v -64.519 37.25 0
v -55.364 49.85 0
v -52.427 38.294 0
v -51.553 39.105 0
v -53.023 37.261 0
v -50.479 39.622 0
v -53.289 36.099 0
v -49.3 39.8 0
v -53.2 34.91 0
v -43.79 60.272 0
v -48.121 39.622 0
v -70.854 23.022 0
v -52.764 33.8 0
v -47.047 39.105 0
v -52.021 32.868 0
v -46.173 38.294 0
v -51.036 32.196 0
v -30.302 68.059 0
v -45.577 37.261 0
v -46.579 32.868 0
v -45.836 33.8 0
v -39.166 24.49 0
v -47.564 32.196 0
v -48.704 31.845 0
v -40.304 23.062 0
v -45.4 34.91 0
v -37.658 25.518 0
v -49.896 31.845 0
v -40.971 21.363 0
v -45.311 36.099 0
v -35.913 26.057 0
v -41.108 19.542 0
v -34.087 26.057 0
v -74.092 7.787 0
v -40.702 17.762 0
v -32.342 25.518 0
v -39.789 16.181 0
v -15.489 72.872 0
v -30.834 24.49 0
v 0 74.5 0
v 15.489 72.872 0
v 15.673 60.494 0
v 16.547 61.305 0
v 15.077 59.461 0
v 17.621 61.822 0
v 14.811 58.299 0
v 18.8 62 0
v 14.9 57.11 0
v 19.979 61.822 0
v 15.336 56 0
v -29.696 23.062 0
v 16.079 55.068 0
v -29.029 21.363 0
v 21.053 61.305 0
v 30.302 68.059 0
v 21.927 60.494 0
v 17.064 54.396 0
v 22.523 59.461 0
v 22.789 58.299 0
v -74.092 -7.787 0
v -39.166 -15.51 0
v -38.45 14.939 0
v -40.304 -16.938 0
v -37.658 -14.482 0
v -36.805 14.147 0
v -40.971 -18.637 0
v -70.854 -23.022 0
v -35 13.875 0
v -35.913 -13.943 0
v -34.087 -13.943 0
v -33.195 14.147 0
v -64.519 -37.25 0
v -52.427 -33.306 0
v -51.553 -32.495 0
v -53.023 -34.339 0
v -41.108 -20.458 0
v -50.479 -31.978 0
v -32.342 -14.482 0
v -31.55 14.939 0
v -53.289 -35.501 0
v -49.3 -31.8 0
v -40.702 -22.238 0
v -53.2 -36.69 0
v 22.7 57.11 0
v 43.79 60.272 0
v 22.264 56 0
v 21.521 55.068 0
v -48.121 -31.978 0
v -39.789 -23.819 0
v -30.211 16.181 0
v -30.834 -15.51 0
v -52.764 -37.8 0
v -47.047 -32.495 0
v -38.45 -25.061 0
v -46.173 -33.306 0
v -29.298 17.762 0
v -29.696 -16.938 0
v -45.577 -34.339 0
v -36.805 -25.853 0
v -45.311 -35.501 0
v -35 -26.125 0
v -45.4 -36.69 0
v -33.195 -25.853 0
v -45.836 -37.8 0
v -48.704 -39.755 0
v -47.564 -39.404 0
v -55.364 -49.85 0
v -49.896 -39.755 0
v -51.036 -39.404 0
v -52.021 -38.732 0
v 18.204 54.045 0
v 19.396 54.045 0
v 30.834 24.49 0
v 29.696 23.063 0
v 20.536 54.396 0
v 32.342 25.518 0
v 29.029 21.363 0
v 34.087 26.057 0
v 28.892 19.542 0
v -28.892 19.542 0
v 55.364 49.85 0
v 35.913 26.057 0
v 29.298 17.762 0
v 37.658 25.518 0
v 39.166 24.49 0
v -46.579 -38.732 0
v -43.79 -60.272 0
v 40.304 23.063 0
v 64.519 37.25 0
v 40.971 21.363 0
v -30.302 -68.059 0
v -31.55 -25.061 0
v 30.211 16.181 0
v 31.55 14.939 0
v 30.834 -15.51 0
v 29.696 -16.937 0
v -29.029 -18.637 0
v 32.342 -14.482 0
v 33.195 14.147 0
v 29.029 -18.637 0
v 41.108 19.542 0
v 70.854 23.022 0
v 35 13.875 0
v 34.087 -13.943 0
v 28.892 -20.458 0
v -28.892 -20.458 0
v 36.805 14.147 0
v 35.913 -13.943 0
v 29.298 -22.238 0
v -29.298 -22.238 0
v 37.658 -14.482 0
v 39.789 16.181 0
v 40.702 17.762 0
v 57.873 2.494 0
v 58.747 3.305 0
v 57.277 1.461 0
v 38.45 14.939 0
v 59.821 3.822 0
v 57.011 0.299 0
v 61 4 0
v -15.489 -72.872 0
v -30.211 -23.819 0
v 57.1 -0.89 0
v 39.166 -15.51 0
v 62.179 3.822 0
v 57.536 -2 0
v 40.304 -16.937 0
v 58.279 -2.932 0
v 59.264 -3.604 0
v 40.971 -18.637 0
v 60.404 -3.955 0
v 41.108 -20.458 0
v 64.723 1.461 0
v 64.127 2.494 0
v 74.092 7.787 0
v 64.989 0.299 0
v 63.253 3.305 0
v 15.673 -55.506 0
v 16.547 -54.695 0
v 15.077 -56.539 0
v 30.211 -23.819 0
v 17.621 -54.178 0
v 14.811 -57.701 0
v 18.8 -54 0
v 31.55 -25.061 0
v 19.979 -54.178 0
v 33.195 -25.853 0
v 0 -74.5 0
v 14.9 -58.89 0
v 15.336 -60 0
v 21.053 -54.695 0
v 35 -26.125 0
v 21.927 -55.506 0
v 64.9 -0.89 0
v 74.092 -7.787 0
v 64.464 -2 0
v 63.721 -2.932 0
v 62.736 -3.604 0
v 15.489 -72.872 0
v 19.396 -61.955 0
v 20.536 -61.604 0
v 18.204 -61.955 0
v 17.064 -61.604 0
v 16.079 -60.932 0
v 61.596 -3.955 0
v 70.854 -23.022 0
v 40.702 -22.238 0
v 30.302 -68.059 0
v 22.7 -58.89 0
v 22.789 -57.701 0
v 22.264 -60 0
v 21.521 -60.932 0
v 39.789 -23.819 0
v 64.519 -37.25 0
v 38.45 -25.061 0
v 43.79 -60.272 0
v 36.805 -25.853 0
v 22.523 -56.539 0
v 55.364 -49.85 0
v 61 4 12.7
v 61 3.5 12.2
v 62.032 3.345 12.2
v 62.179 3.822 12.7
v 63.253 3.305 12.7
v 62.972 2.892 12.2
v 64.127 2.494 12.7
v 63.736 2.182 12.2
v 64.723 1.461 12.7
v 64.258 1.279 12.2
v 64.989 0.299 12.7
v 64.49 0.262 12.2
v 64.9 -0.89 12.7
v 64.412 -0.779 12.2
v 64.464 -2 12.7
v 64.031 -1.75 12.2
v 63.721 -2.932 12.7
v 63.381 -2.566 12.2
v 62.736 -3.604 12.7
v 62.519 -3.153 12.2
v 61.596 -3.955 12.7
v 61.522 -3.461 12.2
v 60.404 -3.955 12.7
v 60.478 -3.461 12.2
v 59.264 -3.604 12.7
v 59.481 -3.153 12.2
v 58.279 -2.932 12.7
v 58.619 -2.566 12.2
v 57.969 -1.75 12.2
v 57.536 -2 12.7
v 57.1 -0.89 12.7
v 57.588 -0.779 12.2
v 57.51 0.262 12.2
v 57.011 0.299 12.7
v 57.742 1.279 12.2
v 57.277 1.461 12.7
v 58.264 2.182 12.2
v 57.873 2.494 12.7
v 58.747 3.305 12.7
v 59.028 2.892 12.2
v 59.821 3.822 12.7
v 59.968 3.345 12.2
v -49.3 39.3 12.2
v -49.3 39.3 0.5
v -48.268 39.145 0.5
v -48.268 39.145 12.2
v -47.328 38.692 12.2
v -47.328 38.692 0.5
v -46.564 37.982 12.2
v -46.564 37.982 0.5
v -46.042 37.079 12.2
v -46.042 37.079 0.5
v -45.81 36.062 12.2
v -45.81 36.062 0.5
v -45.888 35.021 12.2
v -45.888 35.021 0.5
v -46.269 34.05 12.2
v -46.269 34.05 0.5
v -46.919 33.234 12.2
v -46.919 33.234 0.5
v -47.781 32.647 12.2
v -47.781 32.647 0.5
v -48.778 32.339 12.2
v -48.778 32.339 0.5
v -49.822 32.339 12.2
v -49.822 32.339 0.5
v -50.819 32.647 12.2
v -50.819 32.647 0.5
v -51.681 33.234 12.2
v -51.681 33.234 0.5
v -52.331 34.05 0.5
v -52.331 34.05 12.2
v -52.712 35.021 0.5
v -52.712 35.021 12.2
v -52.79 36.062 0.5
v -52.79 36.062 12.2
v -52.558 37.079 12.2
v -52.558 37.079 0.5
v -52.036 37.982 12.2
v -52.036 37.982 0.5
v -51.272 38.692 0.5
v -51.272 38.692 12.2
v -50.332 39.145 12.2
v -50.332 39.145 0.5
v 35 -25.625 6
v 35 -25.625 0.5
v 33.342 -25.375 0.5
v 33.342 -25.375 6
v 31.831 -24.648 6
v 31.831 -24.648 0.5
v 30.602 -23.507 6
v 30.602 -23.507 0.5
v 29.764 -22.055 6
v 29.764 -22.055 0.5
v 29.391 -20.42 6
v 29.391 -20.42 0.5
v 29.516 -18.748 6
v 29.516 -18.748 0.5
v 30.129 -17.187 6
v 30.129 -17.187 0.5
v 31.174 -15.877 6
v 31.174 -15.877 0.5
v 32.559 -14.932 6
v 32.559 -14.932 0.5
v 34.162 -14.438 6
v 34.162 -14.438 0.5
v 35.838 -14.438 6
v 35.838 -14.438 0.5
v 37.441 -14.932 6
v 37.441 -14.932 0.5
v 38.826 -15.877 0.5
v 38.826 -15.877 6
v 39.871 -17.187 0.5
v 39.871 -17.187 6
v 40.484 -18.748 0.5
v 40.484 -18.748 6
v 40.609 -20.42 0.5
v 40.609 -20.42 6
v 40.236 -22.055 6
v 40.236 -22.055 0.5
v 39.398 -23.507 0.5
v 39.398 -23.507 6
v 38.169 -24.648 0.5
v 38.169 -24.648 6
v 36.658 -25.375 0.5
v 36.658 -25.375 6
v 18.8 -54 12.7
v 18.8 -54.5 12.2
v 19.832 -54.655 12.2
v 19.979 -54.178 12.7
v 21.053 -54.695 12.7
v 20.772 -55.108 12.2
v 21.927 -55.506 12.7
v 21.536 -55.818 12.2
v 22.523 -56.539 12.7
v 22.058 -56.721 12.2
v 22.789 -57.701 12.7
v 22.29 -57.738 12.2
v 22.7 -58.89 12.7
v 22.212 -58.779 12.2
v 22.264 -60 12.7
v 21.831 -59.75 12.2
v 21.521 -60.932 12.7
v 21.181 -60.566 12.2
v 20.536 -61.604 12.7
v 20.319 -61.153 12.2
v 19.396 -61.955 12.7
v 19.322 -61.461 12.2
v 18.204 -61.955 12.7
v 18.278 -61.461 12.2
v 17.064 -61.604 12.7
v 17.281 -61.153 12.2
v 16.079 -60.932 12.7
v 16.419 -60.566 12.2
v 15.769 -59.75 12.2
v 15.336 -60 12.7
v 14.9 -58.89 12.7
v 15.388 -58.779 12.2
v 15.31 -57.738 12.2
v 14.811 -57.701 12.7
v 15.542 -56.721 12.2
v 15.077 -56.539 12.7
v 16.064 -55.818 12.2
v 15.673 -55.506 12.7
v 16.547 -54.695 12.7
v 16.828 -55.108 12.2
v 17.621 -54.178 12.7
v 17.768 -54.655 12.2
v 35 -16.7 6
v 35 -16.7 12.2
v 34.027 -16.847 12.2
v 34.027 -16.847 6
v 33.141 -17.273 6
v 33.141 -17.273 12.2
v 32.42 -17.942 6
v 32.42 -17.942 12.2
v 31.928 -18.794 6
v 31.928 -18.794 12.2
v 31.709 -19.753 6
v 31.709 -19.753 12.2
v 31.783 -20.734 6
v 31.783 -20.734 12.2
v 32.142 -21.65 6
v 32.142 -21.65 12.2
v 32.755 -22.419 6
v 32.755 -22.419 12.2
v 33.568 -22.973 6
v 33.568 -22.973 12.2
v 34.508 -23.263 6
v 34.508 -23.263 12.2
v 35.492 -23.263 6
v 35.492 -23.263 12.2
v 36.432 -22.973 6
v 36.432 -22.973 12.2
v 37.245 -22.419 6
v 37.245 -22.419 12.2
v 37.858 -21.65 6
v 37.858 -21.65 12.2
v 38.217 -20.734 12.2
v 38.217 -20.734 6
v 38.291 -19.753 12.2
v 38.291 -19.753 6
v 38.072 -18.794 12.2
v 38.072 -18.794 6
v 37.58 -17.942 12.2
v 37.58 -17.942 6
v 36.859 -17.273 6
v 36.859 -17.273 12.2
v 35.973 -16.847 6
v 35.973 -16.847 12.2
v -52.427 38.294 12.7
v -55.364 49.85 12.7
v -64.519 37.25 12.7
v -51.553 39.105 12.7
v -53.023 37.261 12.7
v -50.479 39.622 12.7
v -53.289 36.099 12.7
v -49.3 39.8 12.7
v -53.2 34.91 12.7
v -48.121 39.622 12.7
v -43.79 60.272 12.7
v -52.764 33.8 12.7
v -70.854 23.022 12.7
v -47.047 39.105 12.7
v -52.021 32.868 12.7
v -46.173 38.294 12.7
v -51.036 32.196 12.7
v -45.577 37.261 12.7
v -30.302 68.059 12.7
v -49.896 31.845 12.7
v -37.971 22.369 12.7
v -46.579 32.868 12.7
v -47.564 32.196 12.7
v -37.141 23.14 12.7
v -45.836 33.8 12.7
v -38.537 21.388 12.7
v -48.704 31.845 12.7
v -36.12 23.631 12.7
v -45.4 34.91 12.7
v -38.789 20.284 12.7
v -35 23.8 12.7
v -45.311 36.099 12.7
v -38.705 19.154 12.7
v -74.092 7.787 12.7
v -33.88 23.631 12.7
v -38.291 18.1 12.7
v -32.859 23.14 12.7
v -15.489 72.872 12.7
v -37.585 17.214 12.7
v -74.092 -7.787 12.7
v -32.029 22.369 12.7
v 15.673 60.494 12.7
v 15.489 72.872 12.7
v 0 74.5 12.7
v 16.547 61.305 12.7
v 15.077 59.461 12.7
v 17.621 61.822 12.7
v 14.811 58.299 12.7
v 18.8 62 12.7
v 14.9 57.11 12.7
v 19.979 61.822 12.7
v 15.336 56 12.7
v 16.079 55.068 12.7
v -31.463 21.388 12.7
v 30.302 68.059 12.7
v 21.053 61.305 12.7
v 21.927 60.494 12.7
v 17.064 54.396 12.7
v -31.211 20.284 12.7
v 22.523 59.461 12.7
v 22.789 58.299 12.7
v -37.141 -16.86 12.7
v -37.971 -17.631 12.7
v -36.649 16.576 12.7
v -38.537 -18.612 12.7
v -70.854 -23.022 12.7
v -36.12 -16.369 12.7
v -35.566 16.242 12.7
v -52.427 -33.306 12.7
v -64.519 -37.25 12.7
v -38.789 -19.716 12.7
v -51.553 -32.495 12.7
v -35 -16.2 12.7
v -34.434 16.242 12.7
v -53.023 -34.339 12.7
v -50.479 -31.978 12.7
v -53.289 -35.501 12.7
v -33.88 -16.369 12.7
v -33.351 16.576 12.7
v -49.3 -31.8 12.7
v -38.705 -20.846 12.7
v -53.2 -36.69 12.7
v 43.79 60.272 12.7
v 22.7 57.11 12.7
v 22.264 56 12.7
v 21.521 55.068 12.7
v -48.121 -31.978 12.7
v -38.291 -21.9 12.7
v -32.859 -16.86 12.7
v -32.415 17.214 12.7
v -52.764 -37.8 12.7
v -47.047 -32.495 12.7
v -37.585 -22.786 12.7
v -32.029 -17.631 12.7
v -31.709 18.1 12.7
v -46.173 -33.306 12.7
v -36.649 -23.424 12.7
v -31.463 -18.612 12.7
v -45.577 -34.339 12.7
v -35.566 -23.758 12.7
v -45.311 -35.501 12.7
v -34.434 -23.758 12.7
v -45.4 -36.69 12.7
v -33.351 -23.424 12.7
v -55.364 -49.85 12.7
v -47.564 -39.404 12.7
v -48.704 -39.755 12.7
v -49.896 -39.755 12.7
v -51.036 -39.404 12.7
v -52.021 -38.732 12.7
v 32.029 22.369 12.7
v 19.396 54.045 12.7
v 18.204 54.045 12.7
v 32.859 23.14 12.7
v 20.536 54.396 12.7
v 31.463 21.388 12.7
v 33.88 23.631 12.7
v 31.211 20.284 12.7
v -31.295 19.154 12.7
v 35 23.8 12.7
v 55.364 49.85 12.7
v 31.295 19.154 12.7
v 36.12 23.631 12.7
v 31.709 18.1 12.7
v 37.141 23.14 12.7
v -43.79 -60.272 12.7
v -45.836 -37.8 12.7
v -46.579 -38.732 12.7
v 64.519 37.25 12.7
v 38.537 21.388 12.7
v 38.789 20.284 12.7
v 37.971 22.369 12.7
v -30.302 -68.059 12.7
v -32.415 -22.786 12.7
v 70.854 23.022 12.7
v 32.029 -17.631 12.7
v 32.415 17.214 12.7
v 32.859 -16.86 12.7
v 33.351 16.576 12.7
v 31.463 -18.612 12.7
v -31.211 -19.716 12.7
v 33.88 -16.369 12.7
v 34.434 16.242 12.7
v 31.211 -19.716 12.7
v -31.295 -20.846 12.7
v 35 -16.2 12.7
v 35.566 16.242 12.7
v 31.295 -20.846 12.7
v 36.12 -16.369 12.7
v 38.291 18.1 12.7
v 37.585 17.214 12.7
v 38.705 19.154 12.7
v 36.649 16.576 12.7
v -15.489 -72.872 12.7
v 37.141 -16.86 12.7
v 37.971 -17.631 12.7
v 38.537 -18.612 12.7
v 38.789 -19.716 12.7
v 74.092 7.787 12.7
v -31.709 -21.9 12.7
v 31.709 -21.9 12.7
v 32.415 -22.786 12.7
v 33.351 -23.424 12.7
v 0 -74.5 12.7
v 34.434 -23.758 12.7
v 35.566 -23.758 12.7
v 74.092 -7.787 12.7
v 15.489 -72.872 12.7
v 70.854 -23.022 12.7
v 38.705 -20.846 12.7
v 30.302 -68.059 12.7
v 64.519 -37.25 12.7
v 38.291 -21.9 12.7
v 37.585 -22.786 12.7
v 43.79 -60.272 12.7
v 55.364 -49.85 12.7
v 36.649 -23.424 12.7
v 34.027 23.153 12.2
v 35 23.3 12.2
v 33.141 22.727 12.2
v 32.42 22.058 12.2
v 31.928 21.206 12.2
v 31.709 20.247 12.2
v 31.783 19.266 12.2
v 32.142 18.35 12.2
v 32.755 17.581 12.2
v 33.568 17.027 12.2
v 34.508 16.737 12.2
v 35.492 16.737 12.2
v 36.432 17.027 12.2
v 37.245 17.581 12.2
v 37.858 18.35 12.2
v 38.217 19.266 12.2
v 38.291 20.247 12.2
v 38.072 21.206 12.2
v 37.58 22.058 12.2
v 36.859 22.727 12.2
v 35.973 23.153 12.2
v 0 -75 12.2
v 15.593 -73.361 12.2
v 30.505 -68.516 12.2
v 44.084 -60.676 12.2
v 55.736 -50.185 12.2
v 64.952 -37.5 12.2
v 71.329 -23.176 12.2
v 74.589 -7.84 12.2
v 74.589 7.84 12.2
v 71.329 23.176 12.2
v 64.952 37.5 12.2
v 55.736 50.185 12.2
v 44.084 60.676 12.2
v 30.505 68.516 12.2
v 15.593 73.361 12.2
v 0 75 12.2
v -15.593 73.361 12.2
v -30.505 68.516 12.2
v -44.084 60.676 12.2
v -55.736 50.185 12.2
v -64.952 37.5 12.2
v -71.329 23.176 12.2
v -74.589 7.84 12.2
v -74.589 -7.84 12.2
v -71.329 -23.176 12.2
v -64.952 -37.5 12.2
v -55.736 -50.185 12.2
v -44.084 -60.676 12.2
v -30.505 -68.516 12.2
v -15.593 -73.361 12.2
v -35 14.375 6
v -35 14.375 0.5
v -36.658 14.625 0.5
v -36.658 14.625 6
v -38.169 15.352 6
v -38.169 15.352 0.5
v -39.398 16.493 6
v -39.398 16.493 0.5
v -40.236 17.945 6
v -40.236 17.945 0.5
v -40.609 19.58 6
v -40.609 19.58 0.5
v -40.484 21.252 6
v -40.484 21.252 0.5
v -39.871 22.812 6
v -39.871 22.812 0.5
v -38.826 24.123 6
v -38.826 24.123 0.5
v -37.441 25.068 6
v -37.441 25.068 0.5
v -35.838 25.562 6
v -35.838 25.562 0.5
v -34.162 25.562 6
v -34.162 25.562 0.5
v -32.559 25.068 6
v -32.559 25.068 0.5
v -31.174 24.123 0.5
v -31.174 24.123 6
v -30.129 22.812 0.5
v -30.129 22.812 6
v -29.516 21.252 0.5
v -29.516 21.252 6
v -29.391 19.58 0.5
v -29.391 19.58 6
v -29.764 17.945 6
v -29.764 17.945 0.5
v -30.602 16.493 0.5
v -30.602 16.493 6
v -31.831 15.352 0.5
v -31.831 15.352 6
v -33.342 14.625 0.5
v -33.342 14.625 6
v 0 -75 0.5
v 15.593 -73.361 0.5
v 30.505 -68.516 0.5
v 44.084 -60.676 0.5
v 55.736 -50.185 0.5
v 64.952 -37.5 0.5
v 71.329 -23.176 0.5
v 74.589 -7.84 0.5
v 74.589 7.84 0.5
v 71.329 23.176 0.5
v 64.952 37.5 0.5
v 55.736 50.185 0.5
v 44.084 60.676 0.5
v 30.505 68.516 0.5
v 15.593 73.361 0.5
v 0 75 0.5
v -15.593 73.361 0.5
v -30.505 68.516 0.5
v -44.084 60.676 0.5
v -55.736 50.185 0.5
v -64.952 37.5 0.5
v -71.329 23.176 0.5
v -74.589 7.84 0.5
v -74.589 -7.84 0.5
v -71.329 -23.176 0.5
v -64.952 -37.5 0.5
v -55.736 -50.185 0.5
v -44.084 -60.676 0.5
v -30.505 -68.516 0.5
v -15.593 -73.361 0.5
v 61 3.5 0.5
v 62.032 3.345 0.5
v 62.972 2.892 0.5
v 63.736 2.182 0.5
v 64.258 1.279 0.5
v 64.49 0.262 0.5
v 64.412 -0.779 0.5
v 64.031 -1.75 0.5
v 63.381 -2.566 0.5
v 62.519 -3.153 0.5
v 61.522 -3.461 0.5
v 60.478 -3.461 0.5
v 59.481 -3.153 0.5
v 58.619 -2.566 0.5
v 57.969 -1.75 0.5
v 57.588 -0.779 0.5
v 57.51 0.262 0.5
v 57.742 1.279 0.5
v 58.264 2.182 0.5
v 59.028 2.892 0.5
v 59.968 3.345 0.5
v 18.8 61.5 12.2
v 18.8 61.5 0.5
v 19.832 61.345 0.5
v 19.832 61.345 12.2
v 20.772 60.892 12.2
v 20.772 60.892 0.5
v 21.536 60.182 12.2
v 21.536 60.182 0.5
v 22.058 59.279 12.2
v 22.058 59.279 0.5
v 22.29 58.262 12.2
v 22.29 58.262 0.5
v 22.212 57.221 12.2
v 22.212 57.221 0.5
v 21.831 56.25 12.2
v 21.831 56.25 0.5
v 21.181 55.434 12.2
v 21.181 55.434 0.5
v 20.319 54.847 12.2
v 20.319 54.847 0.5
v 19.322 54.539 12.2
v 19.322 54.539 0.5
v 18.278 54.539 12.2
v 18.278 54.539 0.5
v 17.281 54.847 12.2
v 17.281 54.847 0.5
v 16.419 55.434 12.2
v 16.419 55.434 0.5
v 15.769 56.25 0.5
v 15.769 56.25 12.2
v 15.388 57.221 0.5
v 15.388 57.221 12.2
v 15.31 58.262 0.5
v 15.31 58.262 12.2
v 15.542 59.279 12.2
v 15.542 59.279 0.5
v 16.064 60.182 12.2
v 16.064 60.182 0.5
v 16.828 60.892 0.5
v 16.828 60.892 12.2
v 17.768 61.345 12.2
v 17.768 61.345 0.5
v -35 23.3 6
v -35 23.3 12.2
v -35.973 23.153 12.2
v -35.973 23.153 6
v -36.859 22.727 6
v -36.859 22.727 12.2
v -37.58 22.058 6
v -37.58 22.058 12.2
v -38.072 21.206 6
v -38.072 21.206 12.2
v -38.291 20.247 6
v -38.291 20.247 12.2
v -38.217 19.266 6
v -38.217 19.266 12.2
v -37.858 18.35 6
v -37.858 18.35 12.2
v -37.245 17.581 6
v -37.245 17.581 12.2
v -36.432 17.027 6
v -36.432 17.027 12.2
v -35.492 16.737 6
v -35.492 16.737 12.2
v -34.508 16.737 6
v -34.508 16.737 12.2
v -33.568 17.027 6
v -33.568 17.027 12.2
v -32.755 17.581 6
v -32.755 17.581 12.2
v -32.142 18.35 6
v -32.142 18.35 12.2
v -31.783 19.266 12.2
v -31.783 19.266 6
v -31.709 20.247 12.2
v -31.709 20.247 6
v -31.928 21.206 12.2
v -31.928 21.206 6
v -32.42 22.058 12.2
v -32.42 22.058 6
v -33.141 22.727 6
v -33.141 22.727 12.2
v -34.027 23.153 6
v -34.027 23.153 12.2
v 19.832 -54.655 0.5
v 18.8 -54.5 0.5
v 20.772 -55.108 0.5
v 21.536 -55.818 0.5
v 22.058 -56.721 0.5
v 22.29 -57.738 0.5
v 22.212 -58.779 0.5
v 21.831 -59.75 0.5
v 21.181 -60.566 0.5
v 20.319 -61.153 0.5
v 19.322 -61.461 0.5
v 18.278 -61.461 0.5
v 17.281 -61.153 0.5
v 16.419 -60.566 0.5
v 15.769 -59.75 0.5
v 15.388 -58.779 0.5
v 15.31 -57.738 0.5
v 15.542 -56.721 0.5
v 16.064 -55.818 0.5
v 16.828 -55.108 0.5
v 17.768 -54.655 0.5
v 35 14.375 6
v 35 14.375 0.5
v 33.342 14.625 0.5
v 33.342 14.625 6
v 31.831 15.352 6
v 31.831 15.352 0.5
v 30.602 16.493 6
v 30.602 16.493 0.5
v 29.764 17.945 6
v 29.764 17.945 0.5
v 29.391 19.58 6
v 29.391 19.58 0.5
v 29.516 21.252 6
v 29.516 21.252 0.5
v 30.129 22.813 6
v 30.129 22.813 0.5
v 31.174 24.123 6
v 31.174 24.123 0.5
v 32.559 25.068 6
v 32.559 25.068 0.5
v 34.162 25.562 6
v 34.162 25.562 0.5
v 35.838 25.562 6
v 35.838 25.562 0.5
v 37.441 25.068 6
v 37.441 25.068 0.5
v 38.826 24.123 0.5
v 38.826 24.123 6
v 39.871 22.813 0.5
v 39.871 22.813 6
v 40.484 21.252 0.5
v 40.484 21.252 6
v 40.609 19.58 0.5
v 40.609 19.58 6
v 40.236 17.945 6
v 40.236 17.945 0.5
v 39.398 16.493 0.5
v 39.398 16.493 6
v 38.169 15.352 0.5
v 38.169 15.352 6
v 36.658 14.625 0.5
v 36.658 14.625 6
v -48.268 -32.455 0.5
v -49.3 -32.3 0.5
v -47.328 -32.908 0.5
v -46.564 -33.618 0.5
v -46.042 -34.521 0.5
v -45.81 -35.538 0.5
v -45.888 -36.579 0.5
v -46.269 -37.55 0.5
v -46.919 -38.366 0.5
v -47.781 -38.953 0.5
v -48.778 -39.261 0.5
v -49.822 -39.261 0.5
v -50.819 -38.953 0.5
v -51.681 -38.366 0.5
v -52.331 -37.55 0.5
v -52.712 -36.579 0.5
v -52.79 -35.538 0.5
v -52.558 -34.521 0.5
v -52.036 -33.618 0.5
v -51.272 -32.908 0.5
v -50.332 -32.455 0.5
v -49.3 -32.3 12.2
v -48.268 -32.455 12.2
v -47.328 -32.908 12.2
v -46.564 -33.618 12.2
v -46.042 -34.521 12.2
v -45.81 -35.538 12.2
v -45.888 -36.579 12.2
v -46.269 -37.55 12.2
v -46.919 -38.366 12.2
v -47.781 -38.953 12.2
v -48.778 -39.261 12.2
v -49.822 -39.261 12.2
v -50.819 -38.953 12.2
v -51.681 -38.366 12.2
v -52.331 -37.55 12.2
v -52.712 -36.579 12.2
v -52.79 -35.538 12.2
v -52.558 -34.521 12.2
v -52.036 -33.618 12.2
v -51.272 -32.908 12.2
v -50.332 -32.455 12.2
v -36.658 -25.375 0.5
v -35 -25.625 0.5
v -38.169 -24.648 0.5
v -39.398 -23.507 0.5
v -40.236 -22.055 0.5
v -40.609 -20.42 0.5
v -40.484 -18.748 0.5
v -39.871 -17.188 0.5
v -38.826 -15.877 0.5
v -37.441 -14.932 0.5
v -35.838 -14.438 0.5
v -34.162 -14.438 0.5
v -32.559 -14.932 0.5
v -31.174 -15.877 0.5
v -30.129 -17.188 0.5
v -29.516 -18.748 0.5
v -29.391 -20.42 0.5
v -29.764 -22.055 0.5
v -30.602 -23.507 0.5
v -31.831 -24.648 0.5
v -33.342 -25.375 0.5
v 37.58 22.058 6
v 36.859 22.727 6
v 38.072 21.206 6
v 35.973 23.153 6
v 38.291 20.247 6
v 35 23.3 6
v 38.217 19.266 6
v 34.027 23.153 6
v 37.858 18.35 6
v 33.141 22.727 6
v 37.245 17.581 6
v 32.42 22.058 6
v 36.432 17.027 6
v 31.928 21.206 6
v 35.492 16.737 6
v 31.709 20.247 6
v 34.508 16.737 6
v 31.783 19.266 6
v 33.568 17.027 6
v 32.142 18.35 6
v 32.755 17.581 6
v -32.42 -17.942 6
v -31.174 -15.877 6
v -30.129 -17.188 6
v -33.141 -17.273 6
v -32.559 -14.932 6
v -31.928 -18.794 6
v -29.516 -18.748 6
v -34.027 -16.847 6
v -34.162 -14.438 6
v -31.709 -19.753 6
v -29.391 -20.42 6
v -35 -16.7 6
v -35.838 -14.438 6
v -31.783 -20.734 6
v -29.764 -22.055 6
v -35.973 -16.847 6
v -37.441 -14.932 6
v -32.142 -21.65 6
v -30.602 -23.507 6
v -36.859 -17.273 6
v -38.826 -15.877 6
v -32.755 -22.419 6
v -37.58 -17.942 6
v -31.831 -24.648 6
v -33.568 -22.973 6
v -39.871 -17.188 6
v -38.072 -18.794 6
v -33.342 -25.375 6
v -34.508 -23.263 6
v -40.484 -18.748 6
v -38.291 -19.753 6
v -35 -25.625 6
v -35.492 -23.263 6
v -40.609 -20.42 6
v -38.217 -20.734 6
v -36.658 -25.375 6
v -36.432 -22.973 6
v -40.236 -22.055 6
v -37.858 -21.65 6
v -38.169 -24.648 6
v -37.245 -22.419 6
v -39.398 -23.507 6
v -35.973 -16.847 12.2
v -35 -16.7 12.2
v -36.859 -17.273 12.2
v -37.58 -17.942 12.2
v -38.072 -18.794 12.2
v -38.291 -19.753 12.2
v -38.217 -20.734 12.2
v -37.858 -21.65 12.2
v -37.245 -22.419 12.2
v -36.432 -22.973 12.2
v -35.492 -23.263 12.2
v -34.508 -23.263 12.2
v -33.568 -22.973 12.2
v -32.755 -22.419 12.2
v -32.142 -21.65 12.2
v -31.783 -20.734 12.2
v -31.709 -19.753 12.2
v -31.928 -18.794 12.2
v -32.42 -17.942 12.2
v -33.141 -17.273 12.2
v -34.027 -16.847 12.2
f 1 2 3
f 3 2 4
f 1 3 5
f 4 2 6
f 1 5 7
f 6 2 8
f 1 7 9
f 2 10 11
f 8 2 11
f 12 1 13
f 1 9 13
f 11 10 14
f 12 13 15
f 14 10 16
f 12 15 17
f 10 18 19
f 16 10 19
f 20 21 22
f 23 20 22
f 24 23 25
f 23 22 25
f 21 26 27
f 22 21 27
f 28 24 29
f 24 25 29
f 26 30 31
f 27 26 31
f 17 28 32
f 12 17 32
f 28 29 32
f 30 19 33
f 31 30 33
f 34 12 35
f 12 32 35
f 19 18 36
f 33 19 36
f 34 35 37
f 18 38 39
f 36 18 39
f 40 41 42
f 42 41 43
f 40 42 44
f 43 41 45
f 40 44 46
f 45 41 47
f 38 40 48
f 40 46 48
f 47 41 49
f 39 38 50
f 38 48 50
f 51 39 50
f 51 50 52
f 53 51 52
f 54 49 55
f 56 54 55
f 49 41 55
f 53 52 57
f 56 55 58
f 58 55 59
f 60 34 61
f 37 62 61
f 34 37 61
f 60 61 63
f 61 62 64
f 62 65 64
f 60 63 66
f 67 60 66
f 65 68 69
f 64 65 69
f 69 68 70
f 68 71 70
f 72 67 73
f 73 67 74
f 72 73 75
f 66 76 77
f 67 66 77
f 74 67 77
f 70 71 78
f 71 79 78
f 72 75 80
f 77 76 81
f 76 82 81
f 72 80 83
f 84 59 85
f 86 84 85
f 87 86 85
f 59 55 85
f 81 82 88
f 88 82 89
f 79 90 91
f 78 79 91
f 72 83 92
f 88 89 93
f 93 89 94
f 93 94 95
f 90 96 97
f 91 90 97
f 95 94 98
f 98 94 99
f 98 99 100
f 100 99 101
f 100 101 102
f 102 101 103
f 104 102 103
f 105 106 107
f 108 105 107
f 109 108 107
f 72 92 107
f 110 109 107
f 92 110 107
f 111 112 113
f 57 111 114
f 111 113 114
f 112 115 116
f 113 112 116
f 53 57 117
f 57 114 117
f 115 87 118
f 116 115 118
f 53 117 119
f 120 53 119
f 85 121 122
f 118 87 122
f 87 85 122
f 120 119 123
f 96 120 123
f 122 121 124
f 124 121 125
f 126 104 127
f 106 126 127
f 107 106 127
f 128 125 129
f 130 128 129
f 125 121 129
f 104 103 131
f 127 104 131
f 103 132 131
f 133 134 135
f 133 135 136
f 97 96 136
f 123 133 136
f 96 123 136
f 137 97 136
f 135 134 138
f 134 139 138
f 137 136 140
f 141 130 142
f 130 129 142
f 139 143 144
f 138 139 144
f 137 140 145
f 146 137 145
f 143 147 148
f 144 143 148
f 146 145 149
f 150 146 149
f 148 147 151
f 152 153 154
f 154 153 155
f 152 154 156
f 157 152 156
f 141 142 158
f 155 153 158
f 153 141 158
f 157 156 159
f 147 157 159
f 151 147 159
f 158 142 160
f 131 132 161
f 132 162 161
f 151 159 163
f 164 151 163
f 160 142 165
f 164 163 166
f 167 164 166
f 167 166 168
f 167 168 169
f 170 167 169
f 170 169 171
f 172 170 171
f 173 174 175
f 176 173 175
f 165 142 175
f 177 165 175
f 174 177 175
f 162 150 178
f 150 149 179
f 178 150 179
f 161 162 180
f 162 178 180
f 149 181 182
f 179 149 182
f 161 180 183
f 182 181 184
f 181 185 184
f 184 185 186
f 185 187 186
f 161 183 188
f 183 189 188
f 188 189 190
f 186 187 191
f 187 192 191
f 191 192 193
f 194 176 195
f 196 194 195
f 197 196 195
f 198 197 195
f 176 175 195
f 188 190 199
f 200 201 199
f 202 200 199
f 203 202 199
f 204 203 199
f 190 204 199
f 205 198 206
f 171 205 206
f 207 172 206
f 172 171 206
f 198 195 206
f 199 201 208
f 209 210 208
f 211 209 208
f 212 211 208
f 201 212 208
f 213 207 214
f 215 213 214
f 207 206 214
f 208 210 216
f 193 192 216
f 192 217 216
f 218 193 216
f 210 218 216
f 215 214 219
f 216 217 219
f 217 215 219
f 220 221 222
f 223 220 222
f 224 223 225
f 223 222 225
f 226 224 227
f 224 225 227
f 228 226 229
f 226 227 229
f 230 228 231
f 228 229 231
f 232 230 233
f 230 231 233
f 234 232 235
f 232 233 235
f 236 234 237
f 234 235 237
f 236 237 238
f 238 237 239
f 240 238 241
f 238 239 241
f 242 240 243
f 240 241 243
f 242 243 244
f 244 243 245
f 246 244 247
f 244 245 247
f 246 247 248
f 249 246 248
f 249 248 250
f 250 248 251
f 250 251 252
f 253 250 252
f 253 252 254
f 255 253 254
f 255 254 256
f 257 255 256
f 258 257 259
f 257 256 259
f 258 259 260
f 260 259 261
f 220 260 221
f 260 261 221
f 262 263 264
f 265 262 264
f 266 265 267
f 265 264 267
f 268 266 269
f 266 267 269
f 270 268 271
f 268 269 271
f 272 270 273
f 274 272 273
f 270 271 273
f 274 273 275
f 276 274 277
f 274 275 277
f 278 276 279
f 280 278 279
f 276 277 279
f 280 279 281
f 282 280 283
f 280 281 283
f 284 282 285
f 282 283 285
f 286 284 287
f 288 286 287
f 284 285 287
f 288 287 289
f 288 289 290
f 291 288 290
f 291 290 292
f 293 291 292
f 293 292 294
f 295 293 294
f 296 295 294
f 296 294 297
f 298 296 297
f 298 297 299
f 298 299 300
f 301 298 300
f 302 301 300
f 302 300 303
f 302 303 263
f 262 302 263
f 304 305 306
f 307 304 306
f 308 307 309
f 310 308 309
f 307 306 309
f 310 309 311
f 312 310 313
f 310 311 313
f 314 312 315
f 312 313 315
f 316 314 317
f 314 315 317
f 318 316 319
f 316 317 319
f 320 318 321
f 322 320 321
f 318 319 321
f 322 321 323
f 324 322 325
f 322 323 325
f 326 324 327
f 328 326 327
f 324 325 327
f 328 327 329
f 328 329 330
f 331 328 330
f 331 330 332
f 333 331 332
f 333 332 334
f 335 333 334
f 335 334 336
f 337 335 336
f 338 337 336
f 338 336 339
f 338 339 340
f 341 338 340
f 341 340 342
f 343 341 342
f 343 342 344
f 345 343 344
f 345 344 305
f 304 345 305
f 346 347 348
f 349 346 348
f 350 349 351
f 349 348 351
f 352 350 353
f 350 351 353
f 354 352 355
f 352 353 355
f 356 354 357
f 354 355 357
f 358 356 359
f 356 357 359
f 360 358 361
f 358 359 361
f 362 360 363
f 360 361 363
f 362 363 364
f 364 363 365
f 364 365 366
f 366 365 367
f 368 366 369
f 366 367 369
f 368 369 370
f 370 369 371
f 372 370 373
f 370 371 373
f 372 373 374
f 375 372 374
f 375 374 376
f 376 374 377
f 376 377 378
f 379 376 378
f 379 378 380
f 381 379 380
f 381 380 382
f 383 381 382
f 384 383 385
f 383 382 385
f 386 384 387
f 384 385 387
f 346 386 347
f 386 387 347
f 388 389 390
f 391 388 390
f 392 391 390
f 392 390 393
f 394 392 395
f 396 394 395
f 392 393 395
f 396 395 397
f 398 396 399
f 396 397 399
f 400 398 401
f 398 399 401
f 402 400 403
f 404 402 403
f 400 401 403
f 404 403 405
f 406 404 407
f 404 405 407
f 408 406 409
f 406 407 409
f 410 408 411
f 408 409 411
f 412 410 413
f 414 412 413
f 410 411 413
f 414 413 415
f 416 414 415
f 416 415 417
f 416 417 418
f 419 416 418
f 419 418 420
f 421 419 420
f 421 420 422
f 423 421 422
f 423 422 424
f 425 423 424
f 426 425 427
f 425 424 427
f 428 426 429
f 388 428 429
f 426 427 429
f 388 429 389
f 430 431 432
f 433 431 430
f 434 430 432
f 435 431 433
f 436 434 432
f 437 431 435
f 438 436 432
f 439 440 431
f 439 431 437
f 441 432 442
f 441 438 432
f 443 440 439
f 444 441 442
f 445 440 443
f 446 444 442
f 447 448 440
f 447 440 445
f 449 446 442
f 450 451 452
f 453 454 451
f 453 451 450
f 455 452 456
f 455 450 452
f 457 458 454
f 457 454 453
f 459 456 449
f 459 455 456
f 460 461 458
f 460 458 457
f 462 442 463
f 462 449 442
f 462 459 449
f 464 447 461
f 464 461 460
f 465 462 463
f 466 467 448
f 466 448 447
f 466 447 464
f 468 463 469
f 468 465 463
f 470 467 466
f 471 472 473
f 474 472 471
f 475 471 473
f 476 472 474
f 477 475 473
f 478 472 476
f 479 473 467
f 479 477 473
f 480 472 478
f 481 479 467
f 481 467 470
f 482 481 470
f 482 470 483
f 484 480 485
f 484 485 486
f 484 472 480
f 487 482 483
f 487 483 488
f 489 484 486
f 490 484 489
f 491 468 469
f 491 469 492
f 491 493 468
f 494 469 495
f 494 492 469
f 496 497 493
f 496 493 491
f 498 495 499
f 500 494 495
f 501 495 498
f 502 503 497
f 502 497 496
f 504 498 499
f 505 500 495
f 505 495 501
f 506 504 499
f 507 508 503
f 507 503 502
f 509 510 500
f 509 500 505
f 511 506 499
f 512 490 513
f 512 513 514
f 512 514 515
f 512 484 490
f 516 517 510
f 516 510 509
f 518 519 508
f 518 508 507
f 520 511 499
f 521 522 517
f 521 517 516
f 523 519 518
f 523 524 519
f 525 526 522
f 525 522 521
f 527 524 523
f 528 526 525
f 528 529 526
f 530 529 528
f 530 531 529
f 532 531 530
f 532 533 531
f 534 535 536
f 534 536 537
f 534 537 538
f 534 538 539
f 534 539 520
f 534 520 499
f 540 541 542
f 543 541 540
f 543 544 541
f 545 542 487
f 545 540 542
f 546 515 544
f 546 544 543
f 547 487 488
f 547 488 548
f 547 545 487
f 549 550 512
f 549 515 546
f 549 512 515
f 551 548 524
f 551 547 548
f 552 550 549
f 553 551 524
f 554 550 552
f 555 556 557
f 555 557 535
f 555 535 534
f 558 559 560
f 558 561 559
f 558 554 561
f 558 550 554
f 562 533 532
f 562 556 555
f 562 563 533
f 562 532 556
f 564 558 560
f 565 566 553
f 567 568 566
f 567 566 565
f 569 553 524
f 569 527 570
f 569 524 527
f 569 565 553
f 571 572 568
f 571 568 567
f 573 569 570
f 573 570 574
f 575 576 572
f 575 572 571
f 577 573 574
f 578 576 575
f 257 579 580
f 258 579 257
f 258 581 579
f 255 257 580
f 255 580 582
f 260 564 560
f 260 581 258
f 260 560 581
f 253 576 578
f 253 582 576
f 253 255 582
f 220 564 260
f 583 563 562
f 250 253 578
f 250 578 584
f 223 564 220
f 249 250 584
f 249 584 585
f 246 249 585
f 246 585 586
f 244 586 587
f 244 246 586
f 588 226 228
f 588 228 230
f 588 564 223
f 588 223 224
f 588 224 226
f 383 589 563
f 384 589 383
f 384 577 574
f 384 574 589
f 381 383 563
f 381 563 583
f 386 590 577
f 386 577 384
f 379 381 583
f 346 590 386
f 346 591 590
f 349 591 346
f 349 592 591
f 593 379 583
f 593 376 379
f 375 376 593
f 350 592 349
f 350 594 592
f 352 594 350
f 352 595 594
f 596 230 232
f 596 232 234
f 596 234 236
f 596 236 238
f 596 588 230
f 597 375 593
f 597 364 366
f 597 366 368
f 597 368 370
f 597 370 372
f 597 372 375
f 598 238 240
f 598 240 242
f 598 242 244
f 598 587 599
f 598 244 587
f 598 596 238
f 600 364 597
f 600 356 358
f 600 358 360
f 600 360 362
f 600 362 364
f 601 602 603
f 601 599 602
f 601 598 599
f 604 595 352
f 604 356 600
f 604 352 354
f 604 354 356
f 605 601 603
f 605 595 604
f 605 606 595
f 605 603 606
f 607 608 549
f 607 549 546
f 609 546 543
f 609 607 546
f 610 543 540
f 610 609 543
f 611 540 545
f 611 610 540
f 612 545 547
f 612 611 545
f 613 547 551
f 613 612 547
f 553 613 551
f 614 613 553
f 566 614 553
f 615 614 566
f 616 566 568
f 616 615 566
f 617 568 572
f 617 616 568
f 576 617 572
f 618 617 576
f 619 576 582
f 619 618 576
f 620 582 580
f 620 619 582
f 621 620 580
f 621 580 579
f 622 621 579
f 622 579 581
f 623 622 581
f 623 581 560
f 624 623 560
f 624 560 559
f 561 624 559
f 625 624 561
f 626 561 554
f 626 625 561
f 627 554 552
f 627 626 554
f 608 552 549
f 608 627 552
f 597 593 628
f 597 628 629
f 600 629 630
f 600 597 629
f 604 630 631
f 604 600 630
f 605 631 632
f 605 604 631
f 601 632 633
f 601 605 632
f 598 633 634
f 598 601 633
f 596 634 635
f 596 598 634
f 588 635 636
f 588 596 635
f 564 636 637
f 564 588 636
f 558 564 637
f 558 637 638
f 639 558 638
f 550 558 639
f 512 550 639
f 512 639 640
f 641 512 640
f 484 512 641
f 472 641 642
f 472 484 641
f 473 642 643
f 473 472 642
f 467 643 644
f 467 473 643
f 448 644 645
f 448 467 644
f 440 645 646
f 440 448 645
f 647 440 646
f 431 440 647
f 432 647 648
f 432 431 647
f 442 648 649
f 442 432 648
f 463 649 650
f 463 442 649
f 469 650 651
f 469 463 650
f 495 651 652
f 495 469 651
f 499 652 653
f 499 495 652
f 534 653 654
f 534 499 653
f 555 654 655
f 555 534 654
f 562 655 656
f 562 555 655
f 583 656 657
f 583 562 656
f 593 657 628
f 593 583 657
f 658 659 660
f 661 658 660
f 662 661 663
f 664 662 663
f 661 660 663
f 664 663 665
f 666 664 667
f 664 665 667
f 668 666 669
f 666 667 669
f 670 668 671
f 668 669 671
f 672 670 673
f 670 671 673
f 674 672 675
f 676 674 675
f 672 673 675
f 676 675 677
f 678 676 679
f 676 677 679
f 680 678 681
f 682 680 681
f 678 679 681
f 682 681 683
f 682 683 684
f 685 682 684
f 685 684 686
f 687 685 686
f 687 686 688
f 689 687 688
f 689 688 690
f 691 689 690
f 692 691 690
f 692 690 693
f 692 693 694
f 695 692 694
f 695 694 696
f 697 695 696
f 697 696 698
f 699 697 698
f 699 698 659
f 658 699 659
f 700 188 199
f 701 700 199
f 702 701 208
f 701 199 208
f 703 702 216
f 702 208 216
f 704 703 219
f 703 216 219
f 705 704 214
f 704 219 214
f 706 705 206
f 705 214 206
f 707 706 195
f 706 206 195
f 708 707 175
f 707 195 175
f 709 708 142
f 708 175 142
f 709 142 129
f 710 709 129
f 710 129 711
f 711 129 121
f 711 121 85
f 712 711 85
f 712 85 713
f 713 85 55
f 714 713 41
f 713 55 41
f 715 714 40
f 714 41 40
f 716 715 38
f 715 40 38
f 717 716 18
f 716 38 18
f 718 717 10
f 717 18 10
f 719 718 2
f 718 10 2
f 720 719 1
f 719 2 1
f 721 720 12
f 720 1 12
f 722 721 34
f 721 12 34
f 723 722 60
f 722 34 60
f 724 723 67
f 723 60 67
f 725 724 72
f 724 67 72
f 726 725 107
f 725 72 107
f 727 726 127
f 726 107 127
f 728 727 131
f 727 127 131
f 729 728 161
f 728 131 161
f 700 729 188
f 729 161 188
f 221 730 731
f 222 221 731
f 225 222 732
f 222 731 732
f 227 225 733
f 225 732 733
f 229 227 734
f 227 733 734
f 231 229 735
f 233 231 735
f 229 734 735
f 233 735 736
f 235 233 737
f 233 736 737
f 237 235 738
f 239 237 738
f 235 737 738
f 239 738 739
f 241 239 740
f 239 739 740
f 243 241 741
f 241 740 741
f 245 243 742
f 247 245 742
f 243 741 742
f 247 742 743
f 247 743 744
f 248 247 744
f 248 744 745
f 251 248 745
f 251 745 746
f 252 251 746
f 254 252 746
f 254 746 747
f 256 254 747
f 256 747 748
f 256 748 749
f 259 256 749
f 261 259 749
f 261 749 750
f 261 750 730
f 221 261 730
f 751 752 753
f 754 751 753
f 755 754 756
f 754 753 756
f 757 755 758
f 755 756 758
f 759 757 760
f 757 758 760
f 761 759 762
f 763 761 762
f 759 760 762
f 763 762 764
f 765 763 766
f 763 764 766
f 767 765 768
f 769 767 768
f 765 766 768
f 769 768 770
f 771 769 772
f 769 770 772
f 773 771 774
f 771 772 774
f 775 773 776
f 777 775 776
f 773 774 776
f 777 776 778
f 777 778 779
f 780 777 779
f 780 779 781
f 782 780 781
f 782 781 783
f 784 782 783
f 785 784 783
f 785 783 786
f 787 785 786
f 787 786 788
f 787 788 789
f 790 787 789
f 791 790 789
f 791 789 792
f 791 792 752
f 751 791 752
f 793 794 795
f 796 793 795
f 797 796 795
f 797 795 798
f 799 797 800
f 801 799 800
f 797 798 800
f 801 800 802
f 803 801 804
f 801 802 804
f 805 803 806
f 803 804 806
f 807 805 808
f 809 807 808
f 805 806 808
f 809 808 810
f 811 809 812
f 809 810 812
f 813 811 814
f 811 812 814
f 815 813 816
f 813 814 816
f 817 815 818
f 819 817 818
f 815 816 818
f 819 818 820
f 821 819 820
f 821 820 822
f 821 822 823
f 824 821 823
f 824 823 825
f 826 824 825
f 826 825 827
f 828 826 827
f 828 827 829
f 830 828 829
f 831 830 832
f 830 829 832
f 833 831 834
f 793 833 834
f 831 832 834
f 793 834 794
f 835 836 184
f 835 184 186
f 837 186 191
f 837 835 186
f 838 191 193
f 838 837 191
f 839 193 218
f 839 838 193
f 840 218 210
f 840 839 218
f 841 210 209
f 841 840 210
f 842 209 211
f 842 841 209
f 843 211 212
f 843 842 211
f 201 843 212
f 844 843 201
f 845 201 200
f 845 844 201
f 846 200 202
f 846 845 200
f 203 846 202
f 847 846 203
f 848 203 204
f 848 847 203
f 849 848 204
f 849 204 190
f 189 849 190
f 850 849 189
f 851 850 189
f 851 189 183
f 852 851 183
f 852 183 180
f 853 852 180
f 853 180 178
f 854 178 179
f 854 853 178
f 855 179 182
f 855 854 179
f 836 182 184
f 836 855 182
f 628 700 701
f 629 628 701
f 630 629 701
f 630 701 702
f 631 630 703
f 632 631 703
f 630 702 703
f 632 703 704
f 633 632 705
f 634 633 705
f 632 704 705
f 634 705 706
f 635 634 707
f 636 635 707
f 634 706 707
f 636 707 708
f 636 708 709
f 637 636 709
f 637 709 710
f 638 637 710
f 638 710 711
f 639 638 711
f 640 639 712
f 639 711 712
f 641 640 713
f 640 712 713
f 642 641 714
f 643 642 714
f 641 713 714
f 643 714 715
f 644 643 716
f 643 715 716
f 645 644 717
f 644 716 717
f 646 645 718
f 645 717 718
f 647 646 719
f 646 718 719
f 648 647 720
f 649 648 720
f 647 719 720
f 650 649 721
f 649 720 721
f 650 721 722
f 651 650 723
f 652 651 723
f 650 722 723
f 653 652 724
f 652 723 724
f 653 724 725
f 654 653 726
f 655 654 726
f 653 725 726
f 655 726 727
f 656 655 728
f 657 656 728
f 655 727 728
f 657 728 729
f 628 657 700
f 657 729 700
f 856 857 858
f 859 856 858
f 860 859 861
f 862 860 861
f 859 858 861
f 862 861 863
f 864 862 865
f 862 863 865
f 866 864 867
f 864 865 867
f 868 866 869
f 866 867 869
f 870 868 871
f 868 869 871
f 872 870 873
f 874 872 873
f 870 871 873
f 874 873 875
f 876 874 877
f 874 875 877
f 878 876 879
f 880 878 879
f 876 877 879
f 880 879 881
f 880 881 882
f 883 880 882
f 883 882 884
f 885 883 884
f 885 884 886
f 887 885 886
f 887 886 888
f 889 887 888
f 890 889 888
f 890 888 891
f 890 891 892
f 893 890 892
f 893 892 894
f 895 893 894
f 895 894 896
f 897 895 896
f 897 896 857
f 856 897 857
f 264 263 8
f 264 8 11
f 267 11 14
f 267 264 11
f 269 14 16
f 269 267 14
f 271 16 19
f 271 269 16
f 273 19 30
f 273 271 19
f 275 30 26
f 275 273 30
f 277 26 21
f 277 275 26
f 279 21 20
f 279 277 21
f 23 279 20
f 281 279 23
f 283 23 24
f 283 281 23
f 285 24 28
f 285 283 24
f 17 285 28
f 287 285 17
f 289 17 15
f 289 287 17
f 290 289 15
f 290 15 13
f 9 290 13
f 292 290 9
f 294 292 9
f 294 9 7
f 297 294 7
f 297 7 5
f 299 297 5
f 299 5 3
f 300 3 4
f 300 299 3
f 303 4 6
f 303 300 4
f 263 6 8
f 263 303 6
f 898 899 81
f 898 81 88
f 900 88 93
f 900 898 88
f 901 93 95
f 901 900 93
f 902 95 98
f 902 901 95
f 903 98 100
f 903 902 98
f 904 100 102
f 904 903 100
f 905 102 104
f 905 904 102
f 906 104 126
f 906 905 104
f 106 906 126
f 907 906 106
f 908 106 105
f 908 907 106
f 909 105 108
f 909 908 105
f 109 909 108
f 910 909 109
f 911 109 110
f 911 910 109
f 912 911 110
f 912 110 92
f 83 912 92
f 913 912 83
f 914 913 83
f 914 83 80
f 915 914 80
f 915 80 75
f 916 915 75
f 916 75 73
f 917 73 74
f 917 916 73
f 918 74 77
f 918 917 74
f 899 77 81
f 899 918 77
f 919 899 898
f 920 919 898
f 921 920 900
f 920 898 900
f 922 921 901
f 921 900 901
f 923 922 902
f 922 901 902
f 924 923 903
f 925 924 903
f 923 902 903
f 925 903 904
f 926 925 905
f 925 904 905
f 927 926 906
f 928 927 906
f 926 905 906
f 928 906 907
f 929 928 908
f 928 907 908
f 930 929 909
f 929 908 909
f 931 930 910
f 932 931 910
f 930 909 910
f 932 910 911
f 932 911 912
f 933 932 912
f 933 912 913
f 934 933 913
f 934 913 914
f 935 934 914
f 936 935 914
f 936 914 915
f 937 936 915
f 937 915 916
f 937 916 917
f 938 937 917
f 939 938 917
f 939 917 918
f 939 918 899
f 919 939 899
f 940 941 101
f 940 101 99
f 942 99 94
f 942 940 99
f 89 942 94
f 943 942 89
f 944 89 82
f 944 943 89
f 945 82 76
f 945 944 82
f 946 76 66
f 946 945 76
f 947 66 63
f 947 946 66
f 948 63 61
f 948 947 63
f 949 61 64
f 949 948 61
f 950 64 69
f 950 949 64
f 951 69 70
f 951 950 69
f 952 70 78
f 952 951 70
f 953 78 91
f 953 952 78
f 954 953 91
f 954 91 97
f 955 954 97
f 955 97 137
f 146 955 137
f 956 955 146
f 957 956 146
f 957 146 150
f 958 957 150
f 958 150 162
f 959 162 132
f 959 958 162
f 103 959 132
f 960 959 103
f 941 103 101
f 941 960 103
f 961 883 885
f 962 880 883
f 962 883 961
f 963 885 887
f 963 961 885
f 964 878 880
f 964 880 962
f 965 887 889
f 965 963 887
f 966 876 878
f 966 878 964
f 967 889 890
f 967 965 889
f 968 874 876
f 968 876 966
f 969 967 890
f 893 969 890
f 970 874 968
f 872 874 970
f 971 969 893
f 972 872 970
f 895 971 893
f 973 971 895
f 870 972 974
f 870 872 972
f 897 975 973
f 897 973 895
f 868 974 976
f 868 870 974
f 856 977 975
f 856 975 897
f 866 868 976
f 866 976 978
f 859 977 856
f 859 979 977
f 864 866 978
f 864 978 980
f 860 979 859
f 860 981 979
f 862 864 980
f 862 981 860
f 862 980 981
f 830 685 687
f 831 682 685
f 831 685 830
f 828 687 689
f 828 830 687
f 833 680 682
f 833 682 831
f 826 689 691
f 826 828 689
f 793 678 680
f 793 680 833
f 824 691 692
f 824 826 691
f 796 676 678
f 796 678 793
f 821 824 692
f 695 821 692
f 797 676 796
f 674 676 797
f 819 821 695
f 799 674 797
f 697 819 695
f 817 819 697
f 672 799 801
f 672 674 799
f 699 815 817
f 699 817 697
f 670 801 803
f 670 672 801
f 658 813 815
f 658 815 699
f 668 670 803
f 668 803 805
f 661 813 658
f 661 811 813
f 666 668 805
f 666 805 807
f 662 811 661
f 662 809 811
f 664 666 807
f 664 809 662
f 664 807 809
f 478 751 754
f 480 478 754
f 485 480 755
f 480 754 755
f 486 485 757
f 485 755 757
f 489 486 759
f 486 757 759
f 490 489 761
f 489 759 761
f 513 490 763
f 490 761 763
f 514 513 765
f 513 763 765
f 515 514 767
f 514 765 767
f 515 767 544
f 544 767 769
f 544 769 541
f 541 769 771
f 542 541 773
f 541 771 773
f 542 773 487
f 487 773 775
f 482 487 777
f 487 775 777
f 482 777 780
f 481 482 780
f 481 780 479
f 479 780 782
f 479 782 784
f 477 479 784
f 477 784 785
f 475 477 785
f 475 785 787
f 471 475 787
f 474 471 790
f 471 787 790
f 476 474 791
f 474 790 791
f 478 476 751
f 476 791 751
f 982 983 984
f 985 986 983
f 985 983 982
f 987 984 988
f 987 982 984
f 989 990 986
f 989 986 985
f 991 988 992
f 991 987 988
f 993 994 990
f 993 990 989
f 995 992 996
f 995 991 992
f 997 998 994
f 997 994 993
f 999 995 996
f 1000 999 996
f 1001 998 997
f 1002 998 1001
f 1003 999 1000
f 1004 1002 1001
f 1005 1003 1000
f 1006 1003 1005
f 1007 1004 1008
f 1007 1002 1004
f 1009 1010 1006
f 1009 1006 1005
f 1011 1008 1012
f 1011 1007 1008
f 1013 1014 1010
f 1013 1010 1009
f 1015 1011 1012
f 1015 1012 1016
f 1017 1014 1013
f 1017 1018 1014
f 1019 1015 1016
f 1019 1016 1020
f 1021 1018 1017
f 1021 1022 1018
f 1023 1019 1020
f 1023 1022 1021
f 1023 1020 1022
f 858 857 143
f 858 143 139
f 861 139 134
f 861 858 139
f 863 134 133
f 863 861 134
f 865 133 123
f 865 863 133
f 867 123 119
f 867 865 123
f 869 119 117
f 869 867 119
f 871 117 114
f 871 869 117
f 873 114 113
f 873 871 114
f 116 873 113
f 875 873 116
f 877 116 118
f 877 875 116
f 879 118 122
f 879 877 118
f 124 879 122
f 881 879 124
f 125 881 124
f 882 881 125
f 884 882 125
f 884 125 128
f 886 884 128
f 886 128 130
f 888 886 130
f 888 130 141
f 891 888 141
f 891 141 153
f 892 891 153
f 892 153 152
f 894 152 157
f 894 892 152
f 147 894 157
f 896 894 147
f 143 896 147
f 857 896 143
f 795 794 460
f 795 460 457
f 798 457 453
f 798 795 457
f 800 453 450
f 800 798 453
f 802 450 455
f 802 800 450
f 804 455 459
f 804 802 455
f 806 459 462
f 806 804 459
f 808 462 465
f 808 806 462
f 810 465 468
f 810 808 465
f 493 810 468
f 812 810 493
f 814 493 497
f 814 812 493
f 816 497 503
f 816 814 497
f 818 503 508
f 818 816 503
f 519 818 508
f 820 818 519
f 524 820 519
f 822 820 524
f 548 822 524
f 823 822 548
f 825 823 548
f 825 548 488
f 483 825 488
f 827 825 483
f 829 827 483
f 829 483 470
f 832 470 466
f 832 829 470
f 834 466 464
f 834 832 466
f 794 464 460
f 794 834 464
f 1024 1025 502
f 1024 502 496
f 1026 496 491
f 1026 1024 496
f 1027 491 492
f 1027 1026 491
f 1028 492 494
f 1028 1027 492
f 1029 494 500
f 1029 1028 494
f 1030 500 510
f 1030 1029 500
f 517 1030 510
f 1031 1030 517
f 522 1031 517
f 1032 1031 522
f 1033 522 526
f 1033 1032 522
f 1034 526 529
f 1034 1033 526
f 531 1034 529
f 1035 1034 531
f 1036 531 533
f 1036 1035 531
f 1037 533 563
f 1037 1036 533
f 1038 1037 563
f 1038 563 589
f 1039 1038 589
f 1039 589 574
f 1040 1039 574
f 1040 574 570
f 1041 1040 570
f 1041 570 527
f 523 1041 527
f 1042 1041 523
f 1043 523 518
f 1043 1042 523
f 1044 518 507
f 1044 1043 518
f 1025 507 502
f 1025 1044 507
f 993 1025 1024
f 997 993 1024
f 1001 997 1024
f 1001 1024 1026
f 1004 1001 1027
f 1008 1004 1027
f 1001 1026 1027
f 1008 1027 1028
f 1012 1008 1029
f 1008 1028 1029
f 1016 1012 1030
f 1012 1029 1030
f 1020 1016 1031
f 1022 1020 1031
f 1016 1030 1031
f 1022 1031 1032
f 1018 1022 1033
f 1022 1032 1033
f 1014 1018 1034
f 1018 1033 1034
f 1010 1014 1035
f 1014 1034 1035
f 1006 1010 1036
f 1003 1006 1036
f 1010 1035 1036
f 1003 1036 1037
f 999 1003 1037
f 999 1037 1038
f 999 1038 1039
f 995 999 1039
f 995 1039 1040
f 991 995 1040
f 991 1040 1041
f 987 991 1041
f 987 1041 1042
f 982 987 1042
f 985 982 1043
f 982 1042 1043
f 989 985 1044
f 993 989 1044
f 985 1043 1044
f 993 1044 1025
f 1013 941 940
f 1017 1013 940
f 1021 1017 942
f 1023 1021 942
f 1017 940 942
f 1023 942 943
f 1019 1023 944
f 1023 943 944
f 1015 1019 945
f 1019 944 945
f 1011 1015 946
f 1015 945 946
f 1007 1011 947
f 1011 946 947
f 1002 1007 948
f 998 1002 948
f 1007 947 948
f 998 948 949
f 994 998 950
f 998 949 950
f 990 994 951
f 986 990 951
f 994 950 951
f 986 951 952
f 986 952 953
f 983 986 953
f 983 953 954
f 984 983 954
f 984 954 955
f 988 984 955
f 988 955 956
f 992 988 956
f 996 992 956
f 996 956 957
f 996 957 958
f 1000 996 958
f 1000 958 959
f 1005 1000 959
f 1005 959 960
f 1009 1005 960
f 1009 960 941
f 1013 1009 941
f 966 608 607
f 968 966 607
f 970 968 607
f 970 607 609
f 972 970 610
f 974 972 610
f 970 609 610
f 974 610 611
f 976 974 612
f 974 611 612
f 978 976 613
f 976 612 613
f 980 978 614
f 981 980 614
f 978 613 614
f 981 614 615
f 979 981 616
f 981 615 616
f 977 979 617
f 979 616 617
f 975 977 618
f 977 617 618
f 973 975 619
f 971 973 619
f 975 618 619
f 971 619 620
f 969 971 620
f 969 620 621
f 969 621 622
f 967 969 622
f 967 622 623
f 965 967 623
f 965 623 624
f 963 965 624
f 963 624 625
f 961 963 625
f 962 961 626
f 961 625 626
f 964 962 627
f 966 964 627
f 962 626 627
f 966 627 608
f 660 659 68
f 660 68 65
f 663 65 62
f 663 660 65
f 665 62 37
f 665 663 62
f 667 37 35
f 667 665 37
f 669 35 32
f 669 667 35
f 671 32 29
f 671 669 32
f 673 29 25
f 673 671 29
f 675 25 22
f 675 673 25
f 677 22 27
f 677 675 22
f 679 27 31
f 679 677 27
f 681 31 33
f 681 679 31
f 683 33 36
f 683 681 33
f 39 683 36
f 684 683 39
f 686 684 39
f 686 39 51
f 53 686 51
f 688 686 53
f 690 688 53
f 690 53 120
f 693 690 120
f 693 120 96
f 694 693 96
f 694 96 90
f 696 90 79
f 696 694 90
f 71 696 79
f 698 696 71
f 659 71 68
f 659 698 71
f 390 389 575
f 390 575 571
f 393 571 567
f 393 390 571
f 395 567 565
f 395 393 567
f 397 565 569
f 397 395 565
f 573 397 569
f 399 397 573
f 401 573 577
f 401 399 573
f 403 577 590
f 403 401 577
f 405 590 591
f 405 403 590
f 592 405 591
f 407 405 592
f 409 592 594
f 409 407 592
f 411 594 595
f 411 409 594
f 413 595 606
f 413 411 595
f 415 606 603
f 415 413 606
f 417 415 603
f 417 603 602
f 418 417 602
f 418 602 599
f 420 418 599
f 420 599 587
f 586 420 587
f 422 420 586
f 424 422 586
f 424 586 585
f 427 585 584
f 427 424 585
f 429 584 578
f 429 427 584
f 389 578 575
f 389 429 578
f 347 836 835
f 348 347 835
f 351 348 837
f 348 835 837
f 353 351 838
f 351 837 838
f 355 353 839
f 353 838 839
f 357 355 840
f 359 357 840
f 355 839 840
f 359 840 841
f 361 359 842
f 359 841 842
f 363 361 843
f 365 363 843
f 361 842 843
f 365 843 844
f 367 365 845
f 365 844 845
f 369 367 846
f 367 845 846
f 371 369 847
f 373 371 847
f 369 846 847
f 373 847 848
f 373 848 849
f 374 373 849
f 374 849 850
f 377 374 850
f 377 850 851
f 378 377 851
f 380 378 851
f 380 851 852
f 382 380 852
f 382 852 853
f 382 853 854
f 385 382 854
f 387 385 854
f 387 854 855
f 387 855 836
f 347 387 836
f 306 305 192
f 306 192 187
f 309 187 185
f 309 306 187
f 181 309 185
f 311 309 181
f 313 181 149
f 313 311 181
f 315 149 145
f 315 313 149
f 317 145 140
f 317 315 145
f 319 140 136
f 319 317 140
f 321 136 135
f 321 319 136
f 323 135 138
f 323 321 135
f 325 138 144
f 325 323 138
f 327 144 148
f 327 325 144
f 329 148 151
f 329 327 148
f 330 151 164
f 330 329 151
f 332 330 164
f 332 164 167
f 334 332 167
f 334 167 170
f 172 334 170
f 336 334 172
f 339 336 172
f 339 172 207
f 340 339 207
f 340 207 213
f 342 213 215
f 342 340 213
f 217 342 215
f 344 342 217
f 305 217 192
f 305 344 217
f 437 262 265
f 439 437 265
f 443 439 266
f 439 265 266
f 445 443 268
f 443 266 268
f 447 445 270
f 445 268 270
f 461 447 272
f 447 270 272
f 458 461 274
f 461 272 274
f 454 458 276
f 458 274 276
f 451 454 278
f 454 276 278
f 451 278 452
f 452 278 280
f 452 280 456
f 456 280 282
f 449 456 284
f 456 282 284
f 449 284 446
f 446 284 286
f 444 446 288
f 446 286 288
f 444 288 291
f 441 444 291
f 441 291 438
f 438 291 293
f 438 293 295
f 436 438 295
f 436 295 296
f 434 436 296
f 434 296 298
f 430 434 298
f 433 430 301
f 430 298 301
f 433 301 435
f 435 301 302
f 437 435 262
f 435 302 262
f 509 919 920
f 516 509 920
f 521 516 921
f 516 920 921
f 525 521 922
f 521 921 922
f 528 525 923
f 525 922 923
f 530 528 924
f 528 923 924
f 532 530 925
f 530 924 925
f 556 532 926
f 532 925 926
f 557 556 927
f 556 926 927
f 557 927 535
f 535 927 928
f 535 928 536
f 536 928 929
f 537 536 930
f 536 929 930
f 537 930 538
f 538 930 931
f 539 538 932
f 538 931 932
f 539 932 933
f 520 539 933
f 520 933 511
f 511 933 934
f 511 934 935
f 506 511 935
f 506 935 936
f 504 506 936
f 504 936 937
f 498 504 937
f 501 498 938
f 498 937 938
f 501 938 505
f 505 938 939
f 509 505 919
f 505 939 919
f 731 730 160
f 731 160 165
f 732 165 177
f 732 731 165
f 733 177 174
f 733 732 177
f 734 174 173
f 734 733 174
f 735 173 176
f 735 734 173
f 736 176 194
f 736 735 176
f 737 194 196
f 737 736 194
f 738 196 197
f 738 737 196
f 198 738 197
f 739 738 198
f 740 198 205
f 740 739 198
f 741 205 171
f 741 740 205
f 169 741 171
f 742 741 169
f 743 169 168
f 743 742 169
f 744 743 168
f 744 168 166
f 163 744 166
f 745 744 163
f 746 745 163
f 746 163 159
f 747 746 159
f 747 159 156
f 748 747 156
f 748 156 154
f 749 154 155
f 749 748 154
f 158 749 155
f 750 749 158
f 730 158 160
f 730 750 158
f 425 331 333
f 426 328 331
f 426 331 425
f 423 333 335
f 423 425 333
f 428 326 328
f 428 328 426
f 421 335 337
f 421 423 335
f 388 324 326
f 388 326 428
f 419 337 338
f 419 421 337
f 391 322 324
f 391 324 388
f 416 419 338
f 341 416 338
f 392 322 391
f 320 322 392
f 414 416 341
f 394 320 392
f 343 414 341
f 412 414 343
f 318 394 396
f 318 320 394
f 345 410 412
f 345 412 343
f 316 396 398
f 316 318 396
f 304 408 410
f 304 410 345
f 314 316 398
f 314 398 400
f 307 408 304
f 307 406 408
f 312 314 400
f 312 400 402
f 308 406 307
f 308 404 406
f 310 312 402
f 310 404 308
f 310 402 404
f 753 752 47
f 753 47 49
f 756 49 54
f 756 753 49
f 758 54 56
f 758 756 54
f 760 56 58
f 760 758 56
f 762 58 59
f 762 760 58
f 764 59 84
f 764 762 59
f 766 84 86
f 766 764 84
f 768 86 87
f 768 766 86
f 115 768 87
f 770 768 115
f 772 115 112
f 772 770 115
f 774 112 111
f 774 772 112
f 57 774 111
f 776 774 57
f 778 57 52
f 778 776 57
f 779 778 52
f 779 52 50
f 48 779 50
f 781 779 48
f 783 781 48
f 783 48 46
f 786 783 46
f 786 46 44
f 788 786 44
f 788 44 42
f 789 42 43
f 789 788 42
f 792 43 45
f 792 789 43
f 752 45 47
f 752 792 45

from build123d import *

# Parameters (mm, degrees)
F0_R           = 75
F1_DEPTH       = 12.7
F2_D           = 6.6
F2_CBORE_D     = 11.25
F2_CBORE_DEPTH = 6
F4_D           = 7
F5_SIZE        = 0.5
F7_ANGLE       = -90


with BuildPart() as f1:
    # F0 (on Top) → F1 (new body)
    with BuildSketch(Plane.XY):
        Circle(F0_R)
    extrude(amount=F1_DEPTH)

    # F2 (through all)
    with Locations(Plane(origin=(0, 0, 0), x_dir=(1, 0, 0), z_dir=(0, 0, -1))):
        with Locations((-20, -35), (20, -35), (-20, 35), (20, 35)):
            CounterBoreHole(F2_D / 2, F2_CBORE_D / 2, F2_CBORE_DEPTH)

    # F4 (through all)
    with Locations(Plane.XY.offset(12.7)):
        with Locations((0, 61), (58, 18.8), (35.8, -49.3), (-35.8, -49.3), (-58, 18.8)):
            Hole(F4_D / 2)

    # F5
    f5_edges = [f1.edges().sort_by_distance(p)[0] for p in [
        (-75, 0, 12.7),
        (-39.3, -49.3, 12.7),
        (-23.3, -35, 12.7),
        (16.7, -35, 12.7),
        (32.3, -49.3, 12.7),
        (-61.5, 18.8, 12.7),
        (-23.3, 35, 12.7),
        (16.7, 35, 12.7),
        (54.5, 18.8, 12.7),
        (-3.5, 61, 12.7),
        (-75, 0, 0),
        (-39.3, -49.3, 0),
        (-25.625, -35, 0),
        (14.375, -35, 0),
        (32.3, -49.3, 0),
        (-61.5, 18.8, 0),
        (-25.625, 35, 0),
        (14.375, 35, 0),
        (54.5, 18.8, 0),
        (-3.5, 61, 0),
    ]]
    chamfer(f5_edges, length=F5_SIZE)


with BuildPart() as f1_1:
    # F7: moved
    add(f1.part.rotate(Axis((0, 0, 4.841263406), (0, 0, 1)), F7_ANGLE))


solid = f1_1.part
